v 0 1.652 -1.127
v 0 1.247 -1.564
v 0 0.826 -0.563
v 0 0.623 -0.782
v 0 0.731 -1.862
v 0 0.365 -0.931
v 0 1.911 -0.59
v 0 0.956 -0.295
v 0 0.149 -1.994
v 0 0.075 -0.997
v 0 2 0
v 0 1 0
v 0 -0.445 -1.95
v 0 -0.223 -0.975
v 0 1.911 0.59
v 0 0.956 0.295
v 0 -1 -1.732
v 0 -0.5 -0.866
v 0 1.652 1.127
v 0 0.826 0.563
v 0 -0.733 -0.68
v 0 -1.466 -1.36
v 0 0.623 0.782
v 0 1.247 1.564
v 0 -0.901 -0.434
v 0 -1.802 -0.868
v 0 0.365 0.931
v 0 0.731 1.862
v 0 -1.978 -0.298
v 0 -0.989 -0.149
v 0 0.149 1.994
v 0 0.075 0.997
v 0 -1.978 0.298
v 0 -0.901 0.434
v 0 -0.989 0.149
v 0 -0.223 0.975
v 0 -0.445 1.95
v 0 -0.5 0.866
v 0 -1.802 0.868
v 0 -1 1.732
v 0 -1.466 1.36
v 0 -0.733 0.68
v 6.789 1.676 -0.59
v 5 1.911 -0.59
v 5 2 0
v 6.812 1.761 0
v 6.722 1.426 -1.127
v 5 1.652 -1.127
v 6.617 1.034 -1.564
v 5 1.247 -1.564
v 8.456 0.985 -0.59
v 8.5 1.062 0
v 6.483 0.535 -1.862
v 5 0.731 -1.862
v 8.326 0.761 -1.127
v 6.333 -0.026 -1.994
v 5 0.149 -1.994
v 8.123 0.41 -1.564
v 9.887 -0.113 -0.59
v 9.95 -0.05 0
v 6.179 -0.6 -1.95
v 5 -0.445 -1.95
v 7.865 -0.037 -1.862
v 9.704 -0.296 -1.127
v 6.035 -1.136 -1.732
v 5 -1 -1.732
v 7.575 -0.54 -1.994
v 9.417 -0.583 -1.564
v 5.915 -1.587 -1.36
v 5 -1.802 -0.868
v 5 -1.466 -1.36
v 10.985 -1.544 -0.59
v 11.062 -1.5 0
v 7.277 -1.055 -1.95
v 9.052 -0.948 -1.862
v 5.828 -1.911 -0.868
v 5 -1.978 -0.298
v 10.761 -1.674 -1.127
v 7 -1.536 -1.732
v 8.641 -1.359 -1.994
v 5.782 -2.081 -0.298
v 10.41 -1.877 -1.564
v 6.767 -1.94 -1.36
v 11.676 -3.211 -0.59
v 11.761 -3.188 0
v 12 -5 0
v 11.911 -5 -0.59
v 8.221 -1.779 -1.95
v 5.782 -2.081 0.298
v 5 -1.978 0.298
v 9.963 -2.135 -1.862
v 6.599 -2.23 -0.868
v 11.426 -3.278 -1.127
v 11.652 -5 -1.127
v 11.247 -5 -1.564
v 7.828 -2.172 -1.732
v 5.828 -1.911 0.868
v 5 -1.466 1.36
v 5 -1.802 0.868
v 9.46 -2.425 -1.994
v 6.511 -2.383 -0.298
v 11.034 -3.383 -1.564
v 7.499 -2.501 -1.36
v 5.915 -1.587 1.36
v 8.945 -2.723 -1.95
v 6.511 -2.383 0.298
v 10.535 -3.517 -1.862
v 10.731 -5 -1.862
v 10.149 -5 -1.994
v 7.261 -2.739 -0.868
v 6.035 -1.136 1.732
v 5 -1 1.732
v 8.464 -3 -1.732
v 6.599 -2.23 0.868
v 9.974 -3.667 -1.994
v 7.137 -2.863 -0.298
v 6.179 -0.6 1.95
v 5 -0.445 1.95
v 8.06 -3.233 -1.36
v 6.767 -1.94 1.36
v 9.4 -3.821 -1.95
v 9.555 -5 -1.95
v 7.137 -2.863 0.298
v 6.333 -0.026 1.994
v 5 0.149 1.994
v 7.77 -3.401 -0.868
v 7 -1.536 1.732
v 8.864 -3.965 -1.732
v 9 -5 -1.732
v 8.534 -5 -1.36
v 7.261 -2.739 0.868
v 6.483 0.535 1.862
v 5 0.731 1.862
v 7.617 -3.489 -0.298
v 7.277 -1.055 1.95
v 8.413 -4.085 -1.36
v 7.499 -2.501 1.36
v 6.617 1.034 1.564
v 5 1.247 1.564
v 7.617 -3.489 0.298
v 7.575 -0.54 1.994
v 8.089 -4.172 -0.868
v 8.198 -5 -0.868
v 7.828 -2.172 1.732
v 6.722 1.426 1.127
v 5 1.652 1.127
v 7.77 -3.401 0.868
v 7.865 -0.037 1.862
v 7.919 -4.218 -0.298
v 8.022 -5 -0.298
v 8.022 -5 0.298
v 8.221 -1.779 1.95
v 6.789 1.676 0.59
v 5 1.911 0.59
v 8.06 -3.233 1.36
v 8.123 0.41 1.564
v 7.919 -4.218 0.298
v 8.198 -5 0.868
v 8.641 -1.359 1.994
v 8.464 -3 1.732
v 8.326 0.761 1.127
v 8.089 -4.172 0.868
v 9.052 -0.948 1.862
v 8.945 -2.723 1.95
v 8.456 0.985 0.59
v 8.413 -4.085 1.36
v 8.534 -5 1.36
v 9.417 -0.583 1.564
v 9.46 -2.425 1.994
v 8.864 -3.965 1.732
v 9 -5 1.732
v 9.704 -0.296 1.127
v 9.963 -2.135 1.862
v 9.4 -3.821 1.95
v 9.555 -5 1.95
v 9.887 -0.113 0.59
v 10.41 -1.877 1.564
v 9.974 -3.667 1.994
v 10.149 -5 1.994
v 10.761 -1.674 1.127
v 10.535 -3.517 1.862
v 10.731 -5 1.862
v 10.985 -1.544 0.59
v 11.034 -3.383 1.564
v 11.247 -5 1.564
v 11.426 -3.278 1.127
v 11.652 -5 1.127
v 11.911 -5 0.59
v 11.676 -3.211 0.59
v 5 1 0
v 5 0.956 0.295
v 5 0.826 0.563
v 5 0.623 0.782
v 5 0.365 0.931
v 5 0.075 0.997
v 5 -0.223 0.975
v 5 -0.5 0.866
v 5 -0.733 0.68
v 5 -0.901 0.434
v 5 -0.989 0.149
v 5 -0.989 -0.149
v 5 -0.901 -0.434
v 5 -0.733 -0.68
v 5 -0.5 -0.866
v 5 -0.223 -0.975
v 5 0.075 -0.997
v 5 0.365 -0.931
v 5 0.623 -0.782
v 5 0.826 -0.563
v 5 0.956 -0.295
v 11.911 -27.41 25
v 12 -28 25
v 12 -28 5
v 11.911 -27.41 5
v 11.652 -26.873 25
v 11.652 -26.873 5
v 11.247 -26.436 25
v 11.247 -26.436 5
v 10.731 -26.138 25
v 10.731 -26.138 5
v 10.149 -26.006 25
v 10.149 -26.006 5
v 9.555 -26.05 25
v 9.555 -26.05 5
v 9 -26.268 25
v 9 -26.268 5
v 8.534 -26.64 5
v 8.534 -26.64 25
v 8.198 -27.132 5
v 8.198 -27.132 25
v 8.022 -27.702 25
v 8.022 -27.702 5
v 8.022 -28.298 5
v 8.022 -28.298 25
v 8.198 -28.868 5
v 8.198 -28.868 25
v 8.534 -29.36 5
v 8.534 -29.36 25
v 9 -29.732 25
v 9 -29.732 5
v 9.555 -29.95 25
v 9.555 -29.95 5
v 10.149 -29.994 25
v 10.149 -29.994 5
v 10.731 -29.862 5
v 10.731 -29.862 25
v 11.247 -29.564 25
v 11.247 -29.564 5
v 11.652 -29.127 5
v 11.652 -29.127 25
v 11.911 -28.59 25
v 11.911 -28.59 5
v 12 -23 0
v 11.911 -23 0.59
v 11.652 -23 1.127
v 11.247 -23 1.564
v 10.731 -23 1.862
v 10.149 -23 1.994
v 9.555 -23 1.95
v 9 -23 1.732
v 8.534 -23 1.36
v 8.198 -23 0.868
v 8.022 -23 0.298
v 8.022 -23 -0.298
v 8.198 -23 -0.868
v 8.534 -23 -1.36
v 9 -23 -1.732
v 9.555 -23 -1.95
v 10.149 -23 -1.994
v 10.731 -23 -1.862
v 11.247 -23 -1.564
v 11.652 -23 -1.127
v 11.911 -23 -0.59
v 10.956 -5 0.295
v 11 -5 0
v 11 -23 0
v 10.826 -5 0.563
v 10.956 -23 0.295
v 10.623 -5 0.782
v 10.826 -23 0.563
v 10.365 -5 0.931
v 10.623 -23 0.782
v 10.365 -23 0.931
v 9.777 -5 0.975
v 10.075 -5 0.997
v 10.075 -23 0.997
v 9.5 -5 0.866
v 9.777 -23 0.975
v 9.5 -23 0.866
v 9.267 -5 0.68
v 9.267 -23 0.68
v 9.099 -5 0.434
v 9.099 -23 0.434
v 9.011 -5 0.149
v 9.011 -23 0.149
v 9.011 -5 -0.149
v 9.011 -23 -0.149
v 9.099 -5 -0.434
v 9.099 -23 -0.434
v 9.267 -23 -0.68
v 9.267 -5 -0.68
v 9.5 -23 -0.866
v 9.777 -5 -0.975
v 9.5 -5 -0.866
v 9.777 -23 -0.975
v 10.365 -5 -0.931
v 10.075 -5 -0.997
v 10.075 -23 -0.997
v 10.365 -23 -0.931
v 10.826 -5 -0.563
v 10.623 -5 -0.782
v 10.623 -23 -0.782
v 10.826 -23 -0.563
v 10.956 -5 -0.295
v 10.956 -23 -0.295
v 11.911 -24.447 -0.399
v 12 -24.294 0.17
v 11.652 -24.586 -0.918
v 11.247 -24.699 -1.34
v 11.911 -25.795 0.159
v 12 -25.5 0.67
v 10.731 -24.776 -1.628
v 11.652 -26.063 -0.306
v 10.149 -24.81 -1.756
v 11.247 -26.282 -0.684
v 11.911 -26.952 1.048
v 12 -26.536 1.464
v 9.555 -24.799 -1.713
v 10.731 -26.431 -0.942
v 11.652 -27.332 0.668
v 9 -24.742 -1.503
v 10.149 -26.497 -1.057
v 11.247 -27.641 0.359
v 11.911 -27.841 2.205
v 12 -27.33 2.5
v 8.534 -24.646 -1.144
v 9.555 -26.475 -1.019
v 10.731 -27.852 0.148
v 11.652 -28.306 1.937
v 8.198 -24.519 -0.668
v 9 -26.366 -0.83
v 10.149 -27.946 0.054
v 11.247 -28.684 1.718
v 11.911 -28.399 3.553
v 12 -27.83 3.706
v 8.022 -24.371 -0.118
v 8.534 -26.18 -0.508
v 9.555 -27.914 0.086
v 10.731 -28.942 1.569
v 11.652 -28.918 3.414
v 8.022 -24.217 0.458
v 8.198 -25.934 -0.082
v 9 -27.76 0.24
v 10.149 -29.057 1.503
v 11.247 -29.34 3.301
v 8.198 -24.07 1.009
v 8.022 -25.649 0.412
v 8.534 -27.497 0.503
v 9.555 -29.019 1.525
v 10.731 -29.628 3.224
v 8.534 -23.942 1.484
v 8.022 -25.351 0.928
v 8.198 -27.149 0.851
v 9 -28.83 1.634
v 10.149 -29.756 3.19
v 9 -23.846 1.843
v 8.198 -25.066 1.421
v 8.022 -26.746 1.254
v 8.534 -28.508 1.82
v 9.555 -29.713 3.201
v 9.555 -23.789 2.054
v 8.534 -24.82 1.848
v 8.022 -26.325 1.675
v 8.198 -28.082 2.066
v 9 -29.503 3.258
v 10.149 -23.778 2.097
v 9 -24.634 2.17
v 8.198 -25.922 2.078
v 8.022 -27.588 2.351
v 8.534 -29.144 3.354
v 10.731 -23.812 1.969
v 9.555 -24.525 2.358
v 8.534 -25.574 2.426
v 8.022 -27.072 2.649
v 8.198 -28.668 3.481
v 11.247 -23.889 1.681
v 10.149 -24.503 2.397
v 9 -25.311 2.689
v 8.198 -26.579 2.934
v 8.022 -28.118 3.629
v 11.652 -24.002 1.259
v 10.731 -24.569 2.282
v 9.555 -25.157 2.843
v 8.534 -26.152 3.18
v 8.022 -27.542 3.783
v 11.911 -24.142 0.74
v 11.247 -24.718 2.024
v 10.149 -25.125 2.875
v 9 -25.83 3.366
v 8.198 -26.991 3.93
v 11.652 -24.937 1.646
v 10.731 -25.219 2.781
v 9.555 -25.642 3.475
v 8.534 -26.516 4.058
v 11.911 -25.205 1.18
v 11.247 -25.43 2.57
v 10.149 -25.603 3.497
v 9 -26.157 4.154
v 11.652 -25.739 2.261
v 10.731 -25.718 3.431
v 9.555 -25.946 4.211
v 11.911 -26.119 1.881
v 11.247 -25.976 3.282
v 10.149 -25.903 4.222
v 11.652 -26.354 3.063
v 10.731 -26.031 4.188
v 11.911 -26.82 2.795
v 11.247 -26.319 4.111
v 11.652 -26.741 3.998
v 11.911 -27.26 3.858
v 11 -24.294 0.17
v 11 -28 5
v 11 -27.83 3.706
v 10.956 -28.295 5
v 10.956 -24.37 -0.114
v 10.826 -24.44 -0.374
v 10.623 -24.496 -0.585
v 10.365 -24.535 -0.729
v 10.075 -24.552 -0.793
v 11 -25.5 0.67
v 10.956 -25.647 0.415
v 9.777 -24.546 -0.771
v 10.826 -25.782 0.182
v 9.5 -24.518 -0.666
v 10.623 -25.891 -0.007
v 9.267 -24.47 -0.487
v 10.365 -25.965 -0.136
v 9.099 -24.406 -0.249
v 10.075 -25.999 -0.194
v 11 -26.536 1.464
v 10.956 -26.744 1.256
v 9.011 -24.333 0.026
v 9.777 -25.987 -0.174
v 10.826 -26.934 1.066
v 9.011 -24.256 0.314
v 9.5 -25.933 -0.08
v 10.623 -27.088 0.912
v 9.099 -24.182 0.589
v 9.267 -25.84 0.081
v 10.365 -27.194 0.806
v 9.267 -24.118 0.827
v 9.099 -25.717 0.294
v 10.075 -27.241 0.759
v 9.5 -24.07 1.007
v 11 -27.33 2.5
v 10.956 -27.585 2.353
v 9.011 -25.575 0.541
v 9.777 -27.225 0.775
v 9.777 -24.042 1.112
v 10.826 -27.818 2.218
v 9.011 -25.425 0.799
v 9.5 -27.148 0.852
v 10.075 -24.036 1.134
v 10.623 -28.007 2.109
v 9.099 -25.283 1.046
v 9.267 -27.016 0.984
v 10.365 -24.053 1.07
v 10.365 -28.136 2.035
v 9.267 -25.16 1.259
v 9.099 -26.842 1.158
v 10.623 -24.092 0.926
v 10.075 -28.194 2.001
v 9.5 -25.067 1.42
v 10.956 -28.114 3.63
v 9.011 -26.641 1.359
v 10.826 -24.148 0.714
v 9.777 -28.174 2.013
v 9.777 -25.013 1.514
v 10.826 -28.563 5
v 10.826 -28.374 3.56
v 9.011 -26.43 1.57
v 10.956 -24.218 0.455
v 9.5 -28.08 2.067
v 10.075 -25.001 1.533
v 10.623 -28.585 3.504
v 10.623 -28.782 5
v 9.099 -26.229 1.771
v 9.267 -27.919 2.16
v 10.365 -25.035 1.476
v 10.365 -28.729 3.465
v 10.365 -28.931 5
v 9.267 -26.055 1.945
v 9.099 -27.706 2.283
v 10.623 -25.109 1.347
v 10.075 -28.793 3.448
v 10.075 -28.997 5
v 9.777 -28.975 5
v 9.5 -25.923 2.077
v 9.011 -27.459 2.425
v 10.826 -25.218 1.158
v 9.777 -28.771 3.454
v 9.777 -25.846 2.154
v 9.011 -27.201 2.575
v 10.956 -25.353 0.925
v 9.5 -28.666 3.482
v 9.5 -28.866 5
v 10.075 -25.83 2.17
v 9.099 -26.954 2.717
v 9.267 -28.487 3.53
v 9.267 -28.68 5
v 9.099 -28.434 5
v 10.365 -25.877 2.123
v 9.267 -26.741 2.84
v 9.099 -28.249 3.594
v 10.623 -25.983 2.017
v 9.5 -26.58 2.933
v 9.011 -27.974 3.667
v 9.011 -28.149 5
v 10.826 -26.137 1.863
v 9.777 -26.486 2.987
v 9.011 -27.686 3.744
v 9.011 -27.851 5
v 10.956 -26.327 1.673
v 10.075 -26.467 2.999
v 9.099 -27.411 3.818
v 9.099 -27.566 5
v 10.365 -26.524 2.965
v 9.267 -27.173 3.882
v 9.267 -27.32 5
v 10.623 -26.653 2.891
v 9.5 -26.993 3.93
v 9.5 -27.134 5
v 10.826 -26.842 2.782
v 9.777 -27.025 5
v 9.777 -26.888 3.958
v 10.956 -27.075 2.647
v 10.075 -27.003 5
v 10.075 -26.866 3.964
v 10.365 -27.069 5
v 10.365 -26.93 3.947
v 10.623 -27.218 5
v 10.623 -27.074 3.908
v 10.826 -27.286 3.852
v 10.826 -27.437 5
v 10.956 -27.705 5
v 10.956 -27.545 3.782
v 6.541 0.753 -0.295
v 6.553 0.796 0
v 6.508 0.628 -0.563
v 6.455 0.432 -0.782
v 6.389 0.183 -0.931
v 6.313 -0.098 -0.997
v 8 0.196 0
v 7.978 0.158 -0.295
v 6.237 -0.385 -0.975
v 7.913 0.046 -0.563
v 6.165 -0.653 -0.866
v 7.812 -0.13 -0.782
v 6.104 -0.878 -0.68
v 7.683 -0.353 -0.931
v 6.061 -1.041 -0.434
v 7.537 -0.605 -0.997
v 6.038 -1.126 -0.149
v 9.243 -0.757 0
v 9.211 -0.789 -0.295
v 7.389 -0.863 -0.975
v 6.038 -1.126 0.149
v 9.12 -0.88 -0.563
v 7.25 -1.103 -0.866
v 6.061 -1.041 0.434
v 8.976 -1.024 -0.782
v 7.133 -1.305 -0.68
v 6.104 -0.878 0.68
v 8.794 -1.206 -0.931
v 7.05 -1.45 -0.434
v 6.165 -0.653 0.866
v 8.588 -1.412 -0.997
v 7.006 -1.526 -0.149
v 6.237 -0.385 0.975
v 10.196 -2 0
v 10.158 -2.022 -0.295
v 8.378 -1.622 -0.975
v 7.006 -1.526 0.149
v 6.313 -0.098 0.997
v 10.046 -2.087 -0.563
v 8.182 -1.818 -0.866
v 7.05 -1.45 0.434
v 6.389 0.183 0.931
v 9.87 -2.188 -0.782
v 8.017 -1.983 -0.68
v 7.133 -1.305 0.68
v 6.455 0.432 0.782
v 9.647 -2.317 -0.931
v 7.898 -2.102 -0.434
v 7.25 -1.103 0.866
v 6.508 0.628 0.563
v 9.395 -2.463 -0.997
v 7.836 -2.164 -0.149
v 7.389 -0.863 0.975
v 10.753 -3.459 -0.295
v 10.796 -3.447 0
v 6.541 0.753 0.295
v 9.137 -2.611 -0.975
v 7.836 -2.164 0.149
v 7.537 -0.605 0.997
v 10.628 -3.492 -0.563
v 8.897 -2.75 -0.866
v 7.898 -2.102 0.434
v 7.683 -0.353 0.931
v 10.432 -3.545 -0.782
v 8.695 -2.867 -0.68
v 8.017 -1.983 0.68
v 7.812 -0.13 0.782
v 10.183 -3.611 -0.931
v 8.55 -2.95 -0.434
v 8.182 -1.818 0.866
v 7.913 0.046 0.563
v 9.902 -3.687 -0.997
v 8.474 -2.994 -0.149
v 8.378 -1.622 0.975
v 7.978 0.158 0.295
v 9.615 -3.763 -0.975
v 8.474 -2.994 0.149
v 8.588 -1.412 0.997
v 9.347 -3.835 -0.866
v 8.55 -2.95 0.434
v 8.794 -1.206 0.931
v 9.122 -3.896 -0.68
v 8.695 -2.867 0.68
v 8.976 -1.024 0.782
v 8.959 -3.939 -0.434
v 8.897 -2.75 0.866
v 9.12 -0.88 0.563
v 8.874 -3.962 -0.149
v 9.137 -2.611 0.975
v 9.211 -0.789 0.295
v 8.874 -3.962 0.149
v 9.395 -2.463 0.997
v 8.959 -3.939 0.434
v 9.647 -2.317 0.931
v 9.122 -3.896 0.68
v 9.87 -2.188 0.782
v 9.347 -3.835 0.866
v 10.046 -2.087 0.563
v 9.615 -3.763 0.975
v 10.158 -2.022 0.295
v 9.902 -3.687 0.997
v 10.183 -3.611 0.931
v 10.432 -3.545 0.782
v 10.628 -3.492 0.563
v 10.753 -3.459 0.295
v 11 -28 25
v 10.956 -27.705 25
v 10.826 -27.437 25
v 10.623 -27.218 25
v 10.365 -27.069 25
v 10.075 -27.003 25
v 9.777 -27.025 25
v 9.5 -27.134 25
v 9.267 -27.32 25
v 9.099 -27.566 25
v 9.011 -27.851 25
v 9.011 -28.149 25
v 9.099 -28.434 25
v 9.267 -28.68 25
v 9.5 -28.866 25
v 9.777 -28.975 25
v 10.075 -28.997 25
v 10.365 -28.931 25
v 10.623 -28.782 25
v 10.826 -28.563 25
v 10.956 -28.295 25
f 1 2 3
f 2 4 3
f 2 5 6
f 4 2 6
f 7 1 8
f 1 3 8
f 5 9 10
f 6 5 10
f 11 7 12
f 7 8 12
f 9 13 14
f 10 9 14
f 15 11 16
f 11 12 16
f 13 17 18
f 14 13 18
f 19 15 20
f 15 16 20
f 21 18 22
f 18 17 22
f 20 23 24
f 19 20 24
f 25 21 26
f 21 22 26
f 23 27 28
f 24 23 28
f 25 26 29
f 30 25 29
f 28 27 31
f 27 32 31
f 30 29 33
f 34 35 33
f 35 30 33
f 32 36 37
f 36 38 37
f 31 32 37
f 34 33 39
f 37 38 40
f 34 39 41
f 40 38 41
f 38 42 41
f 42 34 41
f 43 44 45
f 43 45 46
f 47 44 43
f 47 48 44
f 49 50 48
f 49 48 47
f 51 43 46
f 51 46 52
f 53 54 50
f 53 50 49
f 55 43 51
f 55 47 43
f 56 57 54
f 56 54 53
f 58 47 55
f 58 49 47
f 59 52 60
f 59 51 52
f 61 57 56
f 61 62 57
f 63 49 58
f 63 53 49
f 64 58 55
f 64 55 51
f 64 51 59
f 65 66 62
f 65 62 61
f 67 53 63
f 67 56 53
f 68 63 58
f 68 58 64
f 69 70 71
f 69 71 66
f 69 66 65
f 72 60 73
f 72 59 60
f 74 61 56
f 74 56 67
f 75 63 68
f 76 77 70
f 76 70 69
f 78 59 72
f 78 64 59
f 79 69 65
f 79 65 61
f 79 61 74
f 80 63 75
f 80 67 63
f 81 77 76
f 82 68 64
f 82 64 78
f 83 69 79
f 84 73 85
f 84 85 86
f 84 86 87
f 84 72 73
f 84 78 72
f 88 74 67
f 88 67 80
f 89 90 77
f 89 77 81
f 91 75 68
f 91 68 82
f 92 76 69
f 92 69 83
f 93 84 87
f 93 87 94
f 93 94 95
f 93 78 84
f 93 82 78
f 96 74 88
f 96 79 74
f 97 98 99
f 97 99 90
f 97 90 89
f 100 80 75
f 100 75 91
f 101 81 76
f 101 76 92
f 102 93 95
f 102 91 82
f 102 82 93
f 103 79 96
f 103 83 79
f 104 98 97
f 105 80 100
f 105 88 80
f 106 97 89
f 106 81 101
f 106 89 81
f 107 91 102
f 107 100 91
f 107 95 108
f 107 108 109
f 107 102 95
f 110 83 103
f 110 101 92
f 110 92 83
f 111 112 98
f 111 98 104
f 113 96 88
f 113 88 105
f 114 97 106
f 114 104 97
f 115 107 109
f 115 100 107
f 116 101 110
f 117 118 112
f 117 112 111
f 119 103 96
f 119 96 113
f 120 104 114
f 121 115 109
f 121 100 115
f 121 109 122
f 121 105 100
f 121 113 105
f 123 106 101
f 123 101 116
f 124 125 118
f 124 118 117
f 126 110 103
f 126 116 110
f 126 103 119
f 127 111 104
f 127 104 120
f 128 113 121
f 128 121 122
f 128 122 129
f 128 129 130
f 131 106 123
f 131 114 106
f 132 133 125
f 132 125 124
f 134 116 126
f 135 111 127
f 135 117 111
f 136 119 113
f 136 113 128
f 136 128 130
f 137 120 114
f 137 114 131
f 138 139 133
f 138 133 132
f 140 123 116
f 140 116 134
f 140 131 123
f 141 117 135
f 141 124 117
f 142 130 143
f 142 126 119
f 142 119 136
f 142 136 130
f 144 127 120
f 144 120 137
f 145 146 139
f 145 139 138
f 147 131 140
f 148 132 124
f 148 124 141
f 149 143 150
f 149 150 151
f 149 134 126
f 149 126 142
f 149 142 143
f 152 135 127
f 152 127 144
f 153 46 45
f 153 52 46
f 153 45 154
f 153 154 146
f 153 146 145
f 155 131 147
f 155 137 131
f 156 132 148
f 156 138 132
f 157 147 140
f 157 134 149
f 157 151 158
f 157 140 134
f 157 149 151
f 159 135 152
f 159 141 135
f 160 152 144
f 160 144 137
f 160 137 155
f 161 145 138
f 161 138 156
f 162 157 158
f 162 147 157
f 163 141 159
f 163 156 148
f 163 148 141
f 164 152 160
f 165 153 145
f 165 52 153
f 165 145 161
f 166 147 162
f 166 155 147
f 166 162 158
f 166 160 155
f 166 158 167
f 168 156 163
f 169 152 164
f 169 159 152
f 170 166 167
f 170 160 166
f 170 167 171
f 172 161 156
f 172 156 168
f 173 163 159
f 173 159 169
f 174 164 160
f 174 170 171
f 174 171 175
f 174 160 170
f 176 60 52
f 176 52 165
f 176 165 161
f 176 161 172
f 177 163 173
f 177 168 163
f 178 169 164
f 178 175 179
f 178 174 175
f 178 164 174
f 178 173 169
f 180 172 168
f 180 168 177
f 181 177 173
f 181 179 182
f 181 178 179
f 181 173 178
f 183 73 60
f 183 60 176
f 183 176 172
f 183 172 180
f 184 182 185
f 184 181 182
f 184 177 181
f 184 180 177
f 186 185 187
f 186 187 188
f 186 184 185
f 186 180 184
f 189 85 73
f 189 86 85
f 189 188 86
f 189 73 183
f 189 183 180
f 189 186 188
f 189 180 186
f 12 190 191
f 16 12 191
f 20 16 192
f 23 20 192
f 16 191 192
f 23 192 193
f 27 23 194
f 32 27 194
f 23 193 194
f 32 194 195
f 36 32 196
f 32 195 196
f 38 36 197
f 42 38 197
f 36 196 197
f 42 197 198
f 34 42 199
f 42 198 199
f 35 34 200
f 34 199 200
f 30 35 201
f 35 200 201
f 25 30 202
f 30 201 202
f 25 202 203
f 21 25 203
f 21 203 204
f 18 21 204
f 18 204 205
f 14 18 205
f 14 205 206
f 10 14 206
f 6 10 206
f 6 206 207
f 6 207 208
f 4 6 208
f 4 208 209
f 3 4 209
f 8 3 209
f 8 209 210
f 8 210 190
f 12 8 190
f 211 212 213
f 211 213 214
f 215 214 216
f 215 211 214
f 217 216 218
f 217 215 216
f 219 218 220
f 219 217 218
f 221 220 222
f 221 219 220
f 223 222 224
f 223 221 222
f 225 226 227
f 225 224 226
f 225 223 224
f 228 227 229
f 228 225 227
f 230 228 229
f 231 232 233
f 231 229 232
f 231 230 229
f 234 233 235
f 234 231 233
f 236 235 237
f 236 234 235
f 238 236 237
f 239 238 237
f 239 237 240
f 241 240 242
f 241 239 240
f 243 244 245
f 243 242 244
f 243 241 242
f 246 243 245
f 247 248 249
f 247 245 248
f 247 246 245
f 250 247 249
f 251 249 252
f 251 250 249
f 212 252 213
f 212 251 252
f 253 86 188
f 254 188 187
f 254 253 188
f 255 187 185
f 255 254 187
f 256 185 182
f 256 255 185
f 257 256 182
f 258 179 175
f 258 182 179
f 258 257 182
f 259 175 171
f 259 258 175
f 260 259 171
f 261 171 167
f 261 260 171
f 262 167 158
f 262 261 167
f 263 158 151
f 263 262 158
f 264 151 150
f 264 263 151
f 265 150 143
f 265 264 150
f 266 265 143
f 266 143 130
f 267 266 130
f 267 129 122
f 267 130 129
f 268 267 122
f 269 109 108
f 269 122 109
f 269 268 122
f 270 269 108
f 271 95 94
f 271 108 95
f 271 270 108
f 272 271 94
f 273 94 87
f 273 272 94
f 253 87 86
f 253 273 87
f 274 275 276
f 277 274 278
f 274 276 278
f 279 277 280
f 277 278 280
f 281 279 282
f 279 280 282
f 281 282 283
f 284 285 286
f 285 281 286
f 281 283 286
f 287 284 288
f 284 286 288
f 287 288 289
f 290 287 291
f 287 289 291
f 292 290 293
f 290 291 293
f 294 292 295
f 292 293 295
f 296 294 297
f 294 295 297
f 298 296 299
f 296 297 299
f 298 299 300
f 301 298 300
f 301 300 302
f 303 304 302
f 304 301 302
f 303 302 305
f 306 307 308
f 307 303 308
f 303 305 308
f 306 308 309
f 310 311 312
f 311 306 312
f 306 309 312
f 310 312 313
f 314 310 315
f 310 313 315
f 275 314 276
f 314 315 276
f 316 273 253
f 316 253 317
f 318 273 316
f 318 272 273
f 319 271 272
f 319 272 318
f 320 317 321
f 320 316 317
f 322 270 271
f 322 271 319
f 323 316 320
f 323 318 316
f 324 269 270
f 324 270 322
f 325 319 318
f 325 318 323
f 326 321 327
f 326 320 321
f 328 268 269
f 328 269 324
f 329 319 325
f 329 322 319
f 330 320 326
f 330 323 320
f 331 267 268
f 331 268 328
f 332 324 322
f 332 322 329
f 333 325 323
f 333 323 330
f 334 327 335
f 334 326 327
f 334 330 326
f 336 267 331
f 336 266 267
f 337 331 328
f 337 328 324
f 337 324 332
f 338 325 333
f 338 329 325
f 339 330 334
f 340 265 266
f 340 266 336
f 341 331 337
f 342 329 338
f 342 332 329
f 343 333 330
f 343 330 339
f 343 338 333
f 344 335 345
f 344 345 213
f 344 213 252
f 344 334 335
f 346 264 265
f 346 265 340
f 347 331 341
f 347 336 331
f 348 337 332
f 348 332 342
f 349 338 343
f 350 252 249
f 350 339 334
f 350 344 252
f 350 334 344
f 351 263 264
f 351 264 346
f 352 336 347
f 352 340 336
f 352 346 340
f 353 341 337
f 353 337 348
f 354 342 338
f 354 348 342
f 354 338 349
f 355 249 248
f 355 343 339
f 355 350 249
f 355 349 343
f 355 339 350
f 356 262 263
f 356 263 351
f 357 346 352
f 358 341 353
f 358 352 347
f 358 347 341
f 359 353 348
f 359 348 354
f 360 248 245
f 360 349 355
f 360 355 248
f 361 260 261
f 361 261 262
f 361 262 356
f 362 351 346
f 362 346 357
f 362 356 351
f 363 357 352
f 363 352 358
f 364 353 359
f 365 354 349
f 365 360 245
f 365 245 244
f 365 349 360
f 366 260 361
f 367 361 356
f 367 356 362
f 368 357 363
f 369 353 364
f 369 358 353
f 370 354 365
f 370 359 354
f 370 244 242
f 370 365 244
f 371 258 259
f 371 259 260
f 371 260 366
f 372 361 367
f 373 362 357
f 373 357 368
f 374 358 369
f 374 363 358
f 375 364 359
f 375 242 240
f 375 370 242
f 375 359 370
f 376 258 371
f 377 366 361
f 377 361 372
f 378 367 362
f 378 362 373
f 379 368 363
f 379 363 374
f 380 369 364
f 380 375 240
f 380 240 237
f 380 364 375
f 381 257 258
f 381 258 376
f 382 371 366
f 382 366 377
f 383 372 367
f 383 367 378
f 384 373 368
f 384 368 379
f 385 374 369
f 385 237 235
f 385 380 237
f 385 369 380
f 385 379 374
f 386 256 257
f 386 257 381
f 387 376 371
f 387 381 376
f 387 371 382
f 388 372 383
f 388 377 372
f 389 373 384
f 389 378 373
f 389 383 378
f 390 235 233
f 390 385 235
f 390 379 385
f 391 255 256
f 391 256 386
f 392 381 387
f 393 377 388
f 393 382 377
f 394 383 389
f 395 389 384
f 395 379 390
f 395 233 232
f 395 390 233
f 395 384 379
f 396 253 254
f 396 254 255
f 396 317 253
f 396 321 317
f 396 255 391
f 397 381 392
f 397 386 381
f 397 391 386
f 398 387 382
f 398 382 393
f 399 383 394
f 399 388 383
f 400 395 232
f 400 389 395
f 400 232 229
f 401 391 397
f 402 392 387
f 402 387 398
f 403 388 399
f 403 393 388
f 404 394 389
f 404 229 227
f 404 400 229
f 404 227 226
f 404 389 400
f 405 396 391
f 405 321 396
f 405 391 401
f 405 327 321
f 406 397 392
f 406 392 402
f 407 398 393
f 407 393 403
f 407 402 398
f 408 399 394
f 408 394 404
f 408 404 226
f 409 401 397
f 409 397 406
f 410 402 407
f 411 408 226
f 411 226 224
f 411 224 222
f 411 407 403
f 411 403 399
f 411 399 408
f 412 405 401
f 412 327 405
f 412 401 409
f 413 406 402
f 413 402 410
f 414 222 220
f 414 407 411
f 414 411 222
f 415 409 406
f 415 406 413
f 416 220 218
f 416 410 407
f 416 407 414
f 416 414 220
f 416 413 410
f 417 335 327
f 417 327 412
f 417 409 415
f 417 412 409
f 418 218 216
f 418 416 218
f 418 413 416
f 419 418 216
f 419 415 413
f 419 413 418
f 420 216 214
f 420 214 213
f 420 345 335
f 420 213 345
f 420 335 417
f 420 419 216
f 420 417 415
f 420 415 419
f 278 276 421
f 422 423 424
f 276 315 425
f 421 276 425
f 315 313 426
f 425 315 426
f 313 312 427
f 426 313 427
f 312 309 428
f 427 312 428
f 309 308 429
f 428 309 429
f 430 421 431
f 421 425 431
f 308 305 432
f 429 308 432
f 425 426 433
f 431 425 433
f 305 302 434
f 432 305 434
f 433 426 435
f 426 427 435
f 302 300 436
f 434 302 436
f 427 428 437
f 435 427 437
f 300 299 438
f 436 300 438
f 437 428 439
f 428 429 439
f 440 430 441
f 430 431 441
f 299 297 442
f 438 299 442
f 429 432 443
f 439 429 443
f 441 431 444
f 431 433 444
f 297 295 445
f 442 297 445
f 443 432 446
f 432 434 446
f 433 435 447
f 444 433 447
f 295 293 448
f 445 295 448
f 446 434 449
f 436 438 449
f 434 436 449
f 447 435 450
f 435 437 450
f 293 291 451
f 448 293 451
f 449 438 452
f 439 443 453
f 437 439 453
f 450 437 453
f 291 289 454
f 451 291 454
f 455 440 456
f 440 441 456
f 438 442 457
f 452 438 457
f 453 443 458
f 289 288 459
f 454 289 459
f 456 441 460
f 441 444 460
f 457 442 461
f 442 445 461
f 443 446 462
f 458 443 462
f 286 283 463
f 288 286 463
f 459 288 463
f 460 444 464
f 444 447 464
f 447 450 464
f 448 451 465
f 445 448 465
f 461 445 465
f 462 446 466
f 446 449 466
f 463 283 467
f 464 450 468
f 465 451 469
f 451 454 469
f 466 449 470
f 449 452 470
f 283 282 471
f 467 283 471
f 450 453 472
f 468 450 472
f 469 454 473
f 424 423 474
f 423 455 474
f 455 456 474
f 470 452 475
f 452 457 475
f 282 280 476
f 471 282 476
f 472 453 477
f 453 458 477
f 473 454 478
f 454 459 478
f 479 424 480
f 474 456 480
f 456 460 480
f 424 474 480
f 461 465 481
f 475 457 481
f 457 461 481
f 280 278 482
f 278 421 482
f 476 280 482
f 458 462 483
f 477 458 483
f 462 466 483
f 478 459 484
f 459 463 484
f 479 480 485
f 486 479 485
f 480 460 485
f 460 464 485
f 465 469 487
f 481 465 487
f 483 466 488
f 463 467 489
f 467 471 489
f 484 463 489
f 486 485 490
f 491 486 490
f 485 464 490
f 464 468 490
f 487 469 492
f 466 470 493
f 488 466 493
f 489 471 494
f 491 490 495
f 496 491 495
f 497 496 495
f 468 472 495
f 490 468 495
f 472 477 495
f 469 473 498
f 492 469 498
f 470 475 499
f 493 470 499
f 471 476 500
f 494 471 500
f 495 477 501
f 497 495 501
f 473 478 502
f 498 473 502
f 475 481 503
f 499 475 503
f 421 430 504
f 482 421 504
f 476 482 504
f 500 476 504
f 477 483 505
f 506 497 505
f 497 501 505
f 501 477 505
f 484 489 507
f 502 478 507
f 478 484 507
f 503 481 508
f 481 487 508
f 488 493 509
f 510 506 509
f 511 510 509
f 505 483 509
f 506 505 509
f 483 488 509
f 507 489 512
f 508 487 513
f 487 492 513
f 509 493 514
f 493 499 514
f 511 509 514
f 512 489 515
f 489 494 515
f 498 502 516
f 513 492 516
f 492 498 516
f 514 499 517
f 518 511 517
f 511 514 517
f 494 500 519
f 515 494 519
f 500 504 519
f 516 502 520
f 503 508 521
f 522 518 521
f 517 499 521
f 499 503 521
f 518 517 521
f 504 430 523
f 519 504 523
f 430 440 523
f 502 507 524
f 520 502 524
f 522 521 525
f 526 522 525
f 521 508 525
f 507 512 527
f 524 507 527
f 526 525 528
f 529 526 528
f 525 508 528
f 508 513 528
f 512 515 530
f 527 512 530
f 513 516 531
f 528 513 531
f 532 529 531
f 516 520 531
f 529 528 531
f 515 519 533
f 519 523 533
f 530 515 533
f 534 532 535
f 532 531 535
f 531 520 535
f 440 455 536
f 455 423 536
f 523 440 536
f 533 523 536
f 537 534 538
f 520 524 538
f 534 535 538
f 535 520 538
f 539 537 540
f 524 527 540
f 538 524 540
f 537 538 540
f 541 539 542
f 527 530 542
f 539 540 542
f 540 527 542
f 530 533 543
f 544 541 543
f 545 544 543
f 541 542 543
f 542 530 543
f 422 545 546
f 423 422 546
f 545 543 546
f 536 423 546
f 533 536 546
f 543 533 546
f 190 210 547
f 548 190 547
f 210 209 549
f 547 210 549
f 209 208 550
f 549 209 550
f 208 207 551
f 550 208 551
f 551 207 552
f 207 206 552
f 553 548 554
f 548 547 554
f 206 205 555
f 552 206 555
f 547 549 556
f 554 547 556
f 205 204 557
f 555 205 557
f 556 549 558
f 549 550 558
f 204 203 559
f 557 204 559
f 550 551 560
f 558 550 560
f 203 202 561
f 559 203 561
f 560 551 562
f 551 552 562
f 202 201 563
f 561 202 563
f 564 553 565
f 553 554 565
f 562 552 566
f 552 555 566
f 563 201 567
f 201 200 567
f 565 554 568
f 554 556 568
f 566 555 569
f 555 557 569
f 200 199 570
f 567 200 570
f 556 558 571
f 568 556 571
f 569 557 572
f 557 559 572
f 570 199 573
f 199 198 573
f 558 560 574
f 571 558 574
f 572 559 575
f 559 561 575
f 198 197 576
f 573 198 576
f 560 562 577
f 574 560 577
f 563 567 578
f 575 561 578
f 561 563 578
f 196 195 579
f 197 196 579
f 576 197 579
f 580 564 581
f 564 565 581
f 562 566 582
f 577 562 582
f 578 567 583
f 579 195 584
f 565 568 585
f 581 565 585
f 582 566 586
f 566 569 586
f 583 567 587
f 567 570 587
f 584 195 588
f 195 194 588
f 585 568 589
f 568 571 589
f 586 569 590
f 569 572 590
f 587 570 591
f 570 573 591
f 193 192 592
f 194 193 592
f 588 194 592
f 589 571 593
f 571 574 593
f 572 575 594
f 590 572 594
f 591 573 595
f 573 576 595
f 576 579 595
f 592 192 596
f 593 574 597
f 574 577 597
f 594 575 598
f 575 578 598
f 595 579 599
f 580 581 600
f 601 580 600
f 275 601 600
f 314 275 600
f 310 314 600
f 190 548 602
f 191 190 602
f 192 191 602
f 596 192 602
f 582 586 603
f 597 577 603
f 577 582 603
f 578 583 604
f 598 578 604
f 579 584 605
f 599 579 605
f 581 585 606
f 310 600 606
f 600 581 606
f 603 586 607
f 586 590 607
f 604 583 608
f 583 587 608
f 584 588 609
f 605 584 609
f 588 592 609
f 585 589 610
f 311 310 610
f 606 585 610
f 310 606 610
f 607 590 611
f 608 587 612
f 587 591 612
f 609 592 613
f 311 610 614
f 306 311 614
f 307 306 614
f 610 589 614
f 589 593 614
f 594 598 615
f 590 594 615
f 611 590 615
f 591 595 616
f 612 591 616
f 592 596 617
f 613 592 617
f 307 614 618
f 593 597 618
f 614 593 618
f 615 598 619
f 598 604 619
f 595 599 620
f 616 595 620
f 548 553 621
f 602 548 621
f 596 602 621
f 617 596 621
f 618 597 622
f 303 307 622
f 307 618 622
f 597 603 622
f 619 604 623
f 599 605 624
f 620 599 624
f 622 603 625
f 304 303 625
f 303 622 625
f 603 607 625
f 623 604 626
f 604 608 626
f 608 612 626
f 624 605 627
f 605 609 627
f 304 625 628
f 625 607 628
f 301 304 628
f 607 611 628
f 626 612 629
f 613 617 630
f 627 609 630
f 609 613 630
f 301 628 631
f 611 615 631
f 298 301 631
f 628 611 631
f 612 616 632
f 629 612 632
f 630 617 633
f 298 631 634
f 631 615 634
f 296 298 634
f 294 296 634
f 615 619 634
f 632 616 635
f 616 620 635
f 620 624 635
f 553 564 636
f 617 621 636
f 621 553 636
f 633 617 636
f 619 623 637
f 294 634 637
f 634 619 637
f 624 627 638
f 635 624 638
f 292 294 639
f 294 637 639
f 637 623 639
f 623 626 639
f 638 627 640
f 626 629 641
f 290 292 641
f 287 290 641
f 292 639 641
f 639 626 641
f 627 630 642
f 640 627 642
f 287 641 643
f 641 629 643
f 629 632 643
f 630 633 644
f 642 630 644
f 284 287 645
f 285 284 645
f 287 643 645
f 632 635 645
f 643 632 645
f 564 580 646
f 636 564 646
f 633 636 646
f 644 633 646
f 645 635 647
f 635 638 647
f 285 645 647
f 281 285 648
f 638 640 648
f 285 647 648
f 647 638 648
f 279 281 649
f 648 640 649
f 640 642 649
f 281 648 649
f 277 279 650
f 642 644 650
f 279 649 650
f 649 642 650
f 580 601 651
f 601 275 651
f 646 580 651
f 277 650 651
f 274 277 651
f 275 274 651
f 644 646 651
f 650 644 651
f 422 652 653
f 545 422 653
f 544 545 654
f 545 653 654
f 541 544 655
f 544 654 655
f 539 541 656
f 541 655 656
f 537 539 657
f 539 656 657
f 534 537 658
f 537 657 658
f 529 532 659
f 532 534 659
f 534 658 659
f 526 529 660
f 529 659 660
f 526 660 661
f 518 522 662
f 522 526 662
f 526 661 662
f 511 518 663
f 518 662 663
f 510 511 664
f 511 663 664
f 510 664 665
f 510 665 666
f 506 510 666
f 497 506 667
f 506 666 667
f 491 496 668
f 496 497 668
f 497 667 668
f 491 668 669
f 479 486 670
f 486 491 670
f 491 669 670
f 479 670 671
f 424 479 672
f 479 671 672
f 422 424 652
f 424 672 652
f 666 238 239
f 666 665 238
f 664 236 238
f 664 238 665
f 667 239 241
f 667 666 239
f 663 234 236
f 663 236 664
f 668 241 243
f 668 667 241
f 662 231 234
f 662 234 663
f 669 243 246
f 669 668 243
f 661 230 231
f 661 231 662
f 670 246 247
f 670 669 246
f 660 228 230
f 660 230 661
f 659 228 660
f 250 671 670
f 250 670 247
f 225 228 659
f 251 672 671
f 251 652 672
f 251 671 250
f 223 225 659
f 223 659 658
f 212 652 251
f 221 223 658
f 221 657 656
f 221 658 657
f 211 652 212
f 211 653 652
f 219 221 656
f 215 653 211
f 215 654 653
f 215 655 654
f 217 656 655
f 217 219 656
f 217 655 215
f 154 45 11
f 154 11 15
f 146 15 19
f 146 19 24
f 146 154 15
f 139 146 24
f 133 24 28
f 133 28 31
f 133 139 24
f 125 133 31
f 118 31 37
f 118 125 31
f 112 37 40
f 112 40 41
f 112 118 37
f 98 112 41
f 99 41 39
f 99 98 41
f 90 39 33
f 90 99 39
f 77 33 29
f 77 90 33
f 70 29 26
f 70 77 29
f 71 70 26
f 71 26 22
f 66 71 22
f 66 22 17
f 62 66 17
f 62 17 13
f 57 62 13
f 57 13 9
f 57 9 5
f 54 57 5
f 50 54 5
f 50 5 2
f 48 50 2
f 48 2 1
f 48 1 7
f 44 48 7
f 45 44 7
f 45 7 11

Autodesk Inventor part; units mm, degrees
ref_plane "YZ Plane" through (0, 0, 0) normal (1, 0, 0) x (0, 1, 0)
ref_plane "XZ Plane" through (0, 0, 0) normal (0, 1, 0) x (-1, 0, 0)
ref_plane "XY Plane" through (0, 0, 0) normal (0, 0, 1) x (1, 0, 0)
sketch "Sketch2" plane through (0, 0, 0) normal (1, 0, 0) x (0, 1, 0)
  circle A0 centre (0, 0) radius 1
  circle A1 centre (0, 0) radius 2
  dimension "d8" = 2
  dimension "d9" = 1
sketch3d "3D Sketch1"
  line L0 (0, 0, 0) -> (5, 0, 0)
  arc A0 (5, 0, 0) -> (10, -5, 0) centre (5, -5, 0) ccw
  line L1 (10, -5, 0) -> (10, -23, 0)
  arc A1 (10, -23, 0) -> (10, -28, 5) centre (10, -23, 5) ccw
  line L2 (10, -28, 5) -> (10, -28, 25)
  dimension "d3" = 10
  dimension "d4" = 28
  dimension "d6" = 5
  dimension "d12" = 25
  dimension "d13" = 5
sweep "Sweep1" add profiles "Sketch2" path "3D Sketch1"
properties part number "Pipe2"
